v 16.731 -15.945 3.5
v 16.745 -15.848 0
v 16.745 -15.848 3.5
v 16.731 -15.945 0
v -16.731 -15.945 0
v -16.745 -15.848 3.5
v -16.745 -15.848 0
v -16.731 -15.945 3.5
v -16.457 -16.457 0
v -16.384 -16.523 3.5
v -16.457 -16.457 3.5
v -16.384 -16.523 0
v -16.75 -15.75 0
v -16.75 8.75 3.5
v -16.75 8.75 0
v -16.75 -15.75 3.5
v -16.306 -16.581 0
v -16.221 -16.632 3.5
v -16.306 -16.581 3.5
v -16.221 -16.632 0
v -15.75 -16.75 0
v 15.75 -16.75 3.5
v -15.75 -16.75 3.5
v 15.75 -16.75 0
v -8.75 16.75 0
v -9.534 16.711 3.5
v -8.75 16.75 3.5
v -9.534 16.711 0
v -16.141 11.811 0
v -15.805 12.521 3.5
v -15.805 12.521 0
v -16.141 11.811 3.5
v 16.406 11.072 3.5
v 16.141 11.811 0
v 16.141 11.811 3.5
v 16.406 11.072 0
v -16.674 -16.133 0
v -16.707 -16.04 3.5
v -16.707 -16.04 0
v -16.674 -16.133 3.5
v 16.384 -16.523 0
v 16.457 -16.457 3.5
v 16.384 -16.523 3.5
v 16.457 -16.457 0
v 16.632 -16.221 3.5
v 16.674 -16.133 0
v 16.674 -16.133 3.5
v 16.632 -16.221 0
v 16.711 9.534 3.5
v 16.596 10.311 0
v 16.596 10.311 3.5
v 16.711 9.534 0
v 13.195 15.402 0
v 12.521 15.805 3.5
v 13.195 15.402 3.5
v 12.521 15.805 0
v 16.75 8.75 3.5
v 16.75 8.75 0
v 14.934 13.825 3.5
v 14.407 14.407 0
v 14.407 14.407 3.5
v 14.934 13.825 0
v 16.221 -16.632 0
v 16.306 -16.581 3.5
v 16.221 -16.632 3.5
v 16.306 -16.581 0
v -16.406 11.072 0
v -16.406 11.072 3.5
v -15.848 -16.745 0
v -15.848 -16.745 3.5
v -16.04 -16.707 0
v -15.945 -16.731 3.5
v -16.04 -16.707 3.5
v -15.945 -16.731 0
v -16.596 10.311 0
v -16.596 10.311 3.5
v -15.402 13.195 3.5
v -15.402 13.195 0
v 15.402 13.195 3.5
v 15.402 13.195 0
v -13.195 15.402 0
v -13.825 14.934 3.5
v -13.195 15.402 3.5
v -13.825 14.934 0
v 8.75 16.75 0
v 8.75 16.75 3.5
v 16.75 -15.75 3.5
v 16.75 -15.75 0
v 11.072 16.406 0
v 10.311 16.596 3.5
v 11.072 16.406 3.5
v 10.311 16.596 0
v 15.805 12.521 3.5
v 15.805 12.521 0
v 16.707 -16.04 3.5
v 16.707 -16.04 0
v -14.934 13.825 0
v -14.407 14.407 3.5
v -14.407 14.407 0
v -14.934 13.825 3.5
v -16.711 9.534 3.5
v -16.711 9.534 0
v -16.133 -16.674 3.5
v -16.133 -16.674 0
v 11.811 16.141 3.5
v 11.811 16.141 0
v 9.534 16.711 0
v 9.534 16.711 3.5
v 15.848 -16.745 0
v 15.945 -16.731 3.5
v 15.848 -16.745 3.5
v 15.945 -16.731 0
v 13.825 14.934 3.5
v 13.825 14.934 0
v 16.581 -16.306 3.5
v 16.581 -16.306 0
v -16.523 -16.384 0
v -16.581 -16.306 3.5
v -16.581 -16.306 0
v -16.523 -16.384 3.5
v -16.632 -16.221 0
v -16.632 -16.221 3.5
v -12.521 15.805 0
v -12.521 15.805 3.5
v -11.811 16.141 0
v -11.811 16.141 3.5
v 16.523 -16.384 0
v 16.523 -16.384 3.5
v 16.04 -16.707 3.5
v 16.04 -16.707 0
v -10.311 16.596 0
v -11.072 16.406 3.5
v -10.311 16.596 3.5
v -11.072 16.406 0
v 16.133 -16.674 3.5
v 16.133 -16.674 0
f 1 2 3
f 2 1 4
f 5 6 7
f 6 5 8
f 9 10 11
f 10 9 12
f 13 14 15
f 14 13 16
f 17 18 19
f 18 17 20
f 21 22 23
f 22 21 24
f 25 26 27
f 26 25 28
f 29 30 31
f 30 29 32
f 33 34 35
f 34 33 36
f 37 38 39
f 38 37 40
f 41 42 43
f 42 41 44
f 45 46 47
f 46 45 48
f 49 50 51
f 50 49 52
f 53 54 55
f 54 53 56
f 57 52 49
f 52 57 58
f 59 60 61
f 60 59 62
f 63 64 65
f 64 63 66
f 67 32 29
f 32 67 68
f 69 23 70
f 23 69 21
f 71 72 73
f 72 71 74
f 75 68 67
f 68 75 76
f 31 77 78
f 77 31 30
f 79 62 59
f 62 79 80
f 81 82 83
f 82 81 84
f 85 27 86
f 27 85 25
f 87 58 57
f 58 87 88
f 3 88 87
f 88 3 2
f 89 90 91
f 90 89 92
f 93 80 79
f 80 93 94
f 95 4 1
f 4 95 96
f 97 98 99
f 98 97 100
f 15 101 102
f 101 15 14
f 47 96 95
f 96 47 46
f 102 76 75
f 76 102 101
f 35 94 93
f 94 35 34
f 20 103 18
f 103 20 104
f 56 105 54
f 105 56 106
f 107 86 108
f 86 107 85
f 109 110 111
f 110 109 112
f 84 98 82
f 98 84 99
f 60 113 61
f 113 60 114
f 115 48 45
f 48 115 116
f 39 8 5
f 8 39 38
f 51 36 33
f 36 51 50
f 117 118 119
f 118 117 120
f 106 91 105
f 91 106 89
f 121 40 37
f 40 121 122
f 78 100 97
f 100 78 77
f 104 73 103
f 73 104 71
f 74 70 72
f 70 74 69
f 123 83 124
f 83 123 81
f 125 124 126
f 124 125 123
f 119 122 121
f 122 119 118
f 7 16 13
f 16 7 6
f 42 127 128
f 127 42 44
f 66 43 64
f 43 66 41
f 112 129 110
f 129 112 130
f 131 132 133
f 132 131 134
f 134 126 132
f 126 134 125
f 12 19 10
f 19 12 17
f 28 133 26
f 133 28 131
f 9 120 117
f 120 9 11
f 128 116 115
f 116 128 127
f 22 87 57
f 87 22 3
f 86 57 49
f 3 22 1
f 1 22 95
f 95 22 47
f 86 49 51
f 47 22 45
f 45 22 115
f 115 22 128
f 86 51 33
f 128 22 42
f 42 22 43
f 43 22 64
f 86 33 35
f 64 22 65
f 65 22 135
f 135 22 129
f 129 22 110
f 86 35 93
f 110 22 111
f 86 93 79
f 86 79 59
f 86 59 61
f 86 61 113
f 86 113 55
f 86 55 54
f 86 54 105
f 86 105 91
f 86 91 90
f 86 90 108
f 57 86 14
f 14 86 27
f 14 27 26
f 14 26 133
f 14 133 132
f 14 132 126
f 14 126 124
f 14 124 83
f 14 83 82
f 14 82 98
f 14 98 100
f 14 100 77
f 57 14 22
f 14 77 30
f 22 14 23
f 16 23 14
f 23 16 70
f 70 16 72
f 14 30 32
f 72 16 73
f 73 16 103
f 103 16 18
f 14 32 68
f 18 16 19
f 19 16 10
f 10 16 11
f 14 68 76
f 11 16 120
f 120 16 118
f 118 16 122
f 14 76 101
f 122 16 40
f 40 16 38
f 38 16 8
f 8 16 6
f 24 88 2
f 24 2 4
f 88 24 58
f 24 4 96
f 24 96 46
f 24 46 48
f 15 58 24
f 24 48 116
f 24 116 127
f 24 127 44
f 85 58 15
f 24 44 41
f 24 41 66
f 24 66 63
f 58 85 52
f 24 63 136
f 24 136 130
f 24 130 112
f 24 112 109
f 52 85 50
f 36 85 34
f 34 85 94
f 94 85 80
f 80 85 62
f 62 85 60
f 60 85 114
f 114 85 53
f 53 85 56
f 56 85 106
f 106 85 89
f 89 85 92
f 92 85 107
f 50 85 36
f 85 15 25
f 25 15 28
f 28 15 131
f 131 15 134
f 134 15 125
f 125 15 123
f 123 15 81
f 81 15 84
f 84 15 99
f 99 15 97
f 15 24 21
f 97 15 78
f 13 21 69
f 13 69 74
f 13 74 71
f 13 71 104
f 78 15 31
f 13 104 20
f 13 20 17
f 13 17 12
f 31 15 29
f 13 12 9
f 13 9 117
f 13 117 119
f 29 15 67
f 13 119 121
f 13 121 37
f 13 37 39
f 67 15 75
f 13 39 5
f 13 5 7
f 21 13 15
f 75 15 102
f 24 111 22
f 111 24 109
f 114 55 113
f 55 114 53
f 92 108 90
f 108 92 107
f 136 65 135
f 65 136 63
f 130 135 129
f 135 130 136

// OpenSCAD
/*
 * Nomad Core - Puck v2.1 (With Insertion Guide Rounds)
 * Quick-release mounting interface with selective corner rounding
 * 
 * Front corners are rounded for easy sliding insertion into mount
 * Back corners are sharper for tight fit when fully inserted
 */

// ============================================
// PUCK CONFIGURATION
// ============================================
// All puck settings consolidated here for easy adjustment:
// - Main dimensions (size and height)
// - Corner rounding (front vs back)
// - Optional mounting holes
// - Fit adjustment (tolerance)

// ============================================
// MAIN DIMENSIONS
// ============================================
puck_size = 33.5;           // Square footprint (mm)
base_height = 3.5;          // Base thickness (mm)

// ============================================
// CORNER ROUNDING
// ============================================
// Front two corners (toward hand) are rounded for insertion guidance
front_corner_radius = 8.0;  // TIGHT fit (tested: 7.5=loose, 8.0=tight)
back_corner_radius = 1.0;   // Sharper corners for secure fit

// ============================================
// MOUNTING HOLES (OPTIONAL)
// ============================================
add_mounting_holes = false;      // Toggle mounting holes
mounting_hole_dia = 3.5;         // Hole diameter (mm)
mounting_hole_spacing = 25.0;    // Center-to-center spacing (mm)
mounting_hole_depth = 3.0;       // Depth from top (mm)

// ============================================
// FIT ADJUSTMENT
// ============================================
tolerance = 0.0;  // Adjust for printer calibration (mm)

// ============================================
// RENDER QUALITY
// ============================================
$fn = 64;

// ============================================
// CALCULATED VALUES
// ============================================
actual_size = puck_size + tolerance;
mounting_offset = mounting_hole_spacing / 2;

// ============================================
// PUCK BODY WITH SELECTIVE CORNER ROUNDING
// ============================================
// Creates base body with different corner radii
// Front (positive Y) = rounded for insertion
// Back (negative Y) = sharper corners for fit

module puck_body_with_selective_rounds() {
    hull() {
        // Front-right corner (rounded for insertion)
        translate([actual_size/2 - front_corner_radius, actual_size/2 - front_corner_radius, 0])
            cylinder(h=base_height, r=front_corner_radius);
        
        // Front-left corner (rounded for insertion)
        translate([-actual_size/2 + front_corner_radius, actual_size/2 - front_corner_radius, 0])
            cylinder(h=base_height, r=front_corner_radius);
        
        // Back-right corner (sharper)
        translate([actual_size/2 - back_corner_radius, -actual_size/2 + back_corner_radius, 0])
            cylinder(h=base_height, r=back_corner_radius);
        
        // Back-left corner (sharper)
        translate([-actual_size/2 + back_corner_radius, -actual_size/2 + back_corner_radius, 0])
            cylinder(h=base_height, r=back_corner_radius);
    }
}

// ============================================
// MOUNTING HOLES
// ============================================
// Optional mounting holes for securing puck to band mount

module mounting_holes() {
    if (add_mounting_holes) {
        hole_depth = (mounting_hole_depth > base_height) ? base_height + 0.2 : mounting_hole_depth + 0.1;
        
        for (x = [-1, 1]) {
            for (y = [-1, 1]) {
                translate([x * mounting_offset, y * mounting_offset, base_height - hole_depth + 0.1])
                    cylinder(h=hole_depth, d=mounting_hole_dia);
            }
        }
    }
}

// ============================================
// COMPLETE PUCK ASSEMBLY
// ============================================
module puck_design() {
    difference() {
        puck_body_with_selective_rounds();
        mounting_holes();
    }
    
    // Orientation marker (small notch on front edge)
    translate([0, actual_size/2 - 1, base_height/2])
        rotate([0, 45, 0])
        cube([1, 2, 1], center=true);
}

// ============================================
// MAIN RENDER
// ============================================
puck_design();
